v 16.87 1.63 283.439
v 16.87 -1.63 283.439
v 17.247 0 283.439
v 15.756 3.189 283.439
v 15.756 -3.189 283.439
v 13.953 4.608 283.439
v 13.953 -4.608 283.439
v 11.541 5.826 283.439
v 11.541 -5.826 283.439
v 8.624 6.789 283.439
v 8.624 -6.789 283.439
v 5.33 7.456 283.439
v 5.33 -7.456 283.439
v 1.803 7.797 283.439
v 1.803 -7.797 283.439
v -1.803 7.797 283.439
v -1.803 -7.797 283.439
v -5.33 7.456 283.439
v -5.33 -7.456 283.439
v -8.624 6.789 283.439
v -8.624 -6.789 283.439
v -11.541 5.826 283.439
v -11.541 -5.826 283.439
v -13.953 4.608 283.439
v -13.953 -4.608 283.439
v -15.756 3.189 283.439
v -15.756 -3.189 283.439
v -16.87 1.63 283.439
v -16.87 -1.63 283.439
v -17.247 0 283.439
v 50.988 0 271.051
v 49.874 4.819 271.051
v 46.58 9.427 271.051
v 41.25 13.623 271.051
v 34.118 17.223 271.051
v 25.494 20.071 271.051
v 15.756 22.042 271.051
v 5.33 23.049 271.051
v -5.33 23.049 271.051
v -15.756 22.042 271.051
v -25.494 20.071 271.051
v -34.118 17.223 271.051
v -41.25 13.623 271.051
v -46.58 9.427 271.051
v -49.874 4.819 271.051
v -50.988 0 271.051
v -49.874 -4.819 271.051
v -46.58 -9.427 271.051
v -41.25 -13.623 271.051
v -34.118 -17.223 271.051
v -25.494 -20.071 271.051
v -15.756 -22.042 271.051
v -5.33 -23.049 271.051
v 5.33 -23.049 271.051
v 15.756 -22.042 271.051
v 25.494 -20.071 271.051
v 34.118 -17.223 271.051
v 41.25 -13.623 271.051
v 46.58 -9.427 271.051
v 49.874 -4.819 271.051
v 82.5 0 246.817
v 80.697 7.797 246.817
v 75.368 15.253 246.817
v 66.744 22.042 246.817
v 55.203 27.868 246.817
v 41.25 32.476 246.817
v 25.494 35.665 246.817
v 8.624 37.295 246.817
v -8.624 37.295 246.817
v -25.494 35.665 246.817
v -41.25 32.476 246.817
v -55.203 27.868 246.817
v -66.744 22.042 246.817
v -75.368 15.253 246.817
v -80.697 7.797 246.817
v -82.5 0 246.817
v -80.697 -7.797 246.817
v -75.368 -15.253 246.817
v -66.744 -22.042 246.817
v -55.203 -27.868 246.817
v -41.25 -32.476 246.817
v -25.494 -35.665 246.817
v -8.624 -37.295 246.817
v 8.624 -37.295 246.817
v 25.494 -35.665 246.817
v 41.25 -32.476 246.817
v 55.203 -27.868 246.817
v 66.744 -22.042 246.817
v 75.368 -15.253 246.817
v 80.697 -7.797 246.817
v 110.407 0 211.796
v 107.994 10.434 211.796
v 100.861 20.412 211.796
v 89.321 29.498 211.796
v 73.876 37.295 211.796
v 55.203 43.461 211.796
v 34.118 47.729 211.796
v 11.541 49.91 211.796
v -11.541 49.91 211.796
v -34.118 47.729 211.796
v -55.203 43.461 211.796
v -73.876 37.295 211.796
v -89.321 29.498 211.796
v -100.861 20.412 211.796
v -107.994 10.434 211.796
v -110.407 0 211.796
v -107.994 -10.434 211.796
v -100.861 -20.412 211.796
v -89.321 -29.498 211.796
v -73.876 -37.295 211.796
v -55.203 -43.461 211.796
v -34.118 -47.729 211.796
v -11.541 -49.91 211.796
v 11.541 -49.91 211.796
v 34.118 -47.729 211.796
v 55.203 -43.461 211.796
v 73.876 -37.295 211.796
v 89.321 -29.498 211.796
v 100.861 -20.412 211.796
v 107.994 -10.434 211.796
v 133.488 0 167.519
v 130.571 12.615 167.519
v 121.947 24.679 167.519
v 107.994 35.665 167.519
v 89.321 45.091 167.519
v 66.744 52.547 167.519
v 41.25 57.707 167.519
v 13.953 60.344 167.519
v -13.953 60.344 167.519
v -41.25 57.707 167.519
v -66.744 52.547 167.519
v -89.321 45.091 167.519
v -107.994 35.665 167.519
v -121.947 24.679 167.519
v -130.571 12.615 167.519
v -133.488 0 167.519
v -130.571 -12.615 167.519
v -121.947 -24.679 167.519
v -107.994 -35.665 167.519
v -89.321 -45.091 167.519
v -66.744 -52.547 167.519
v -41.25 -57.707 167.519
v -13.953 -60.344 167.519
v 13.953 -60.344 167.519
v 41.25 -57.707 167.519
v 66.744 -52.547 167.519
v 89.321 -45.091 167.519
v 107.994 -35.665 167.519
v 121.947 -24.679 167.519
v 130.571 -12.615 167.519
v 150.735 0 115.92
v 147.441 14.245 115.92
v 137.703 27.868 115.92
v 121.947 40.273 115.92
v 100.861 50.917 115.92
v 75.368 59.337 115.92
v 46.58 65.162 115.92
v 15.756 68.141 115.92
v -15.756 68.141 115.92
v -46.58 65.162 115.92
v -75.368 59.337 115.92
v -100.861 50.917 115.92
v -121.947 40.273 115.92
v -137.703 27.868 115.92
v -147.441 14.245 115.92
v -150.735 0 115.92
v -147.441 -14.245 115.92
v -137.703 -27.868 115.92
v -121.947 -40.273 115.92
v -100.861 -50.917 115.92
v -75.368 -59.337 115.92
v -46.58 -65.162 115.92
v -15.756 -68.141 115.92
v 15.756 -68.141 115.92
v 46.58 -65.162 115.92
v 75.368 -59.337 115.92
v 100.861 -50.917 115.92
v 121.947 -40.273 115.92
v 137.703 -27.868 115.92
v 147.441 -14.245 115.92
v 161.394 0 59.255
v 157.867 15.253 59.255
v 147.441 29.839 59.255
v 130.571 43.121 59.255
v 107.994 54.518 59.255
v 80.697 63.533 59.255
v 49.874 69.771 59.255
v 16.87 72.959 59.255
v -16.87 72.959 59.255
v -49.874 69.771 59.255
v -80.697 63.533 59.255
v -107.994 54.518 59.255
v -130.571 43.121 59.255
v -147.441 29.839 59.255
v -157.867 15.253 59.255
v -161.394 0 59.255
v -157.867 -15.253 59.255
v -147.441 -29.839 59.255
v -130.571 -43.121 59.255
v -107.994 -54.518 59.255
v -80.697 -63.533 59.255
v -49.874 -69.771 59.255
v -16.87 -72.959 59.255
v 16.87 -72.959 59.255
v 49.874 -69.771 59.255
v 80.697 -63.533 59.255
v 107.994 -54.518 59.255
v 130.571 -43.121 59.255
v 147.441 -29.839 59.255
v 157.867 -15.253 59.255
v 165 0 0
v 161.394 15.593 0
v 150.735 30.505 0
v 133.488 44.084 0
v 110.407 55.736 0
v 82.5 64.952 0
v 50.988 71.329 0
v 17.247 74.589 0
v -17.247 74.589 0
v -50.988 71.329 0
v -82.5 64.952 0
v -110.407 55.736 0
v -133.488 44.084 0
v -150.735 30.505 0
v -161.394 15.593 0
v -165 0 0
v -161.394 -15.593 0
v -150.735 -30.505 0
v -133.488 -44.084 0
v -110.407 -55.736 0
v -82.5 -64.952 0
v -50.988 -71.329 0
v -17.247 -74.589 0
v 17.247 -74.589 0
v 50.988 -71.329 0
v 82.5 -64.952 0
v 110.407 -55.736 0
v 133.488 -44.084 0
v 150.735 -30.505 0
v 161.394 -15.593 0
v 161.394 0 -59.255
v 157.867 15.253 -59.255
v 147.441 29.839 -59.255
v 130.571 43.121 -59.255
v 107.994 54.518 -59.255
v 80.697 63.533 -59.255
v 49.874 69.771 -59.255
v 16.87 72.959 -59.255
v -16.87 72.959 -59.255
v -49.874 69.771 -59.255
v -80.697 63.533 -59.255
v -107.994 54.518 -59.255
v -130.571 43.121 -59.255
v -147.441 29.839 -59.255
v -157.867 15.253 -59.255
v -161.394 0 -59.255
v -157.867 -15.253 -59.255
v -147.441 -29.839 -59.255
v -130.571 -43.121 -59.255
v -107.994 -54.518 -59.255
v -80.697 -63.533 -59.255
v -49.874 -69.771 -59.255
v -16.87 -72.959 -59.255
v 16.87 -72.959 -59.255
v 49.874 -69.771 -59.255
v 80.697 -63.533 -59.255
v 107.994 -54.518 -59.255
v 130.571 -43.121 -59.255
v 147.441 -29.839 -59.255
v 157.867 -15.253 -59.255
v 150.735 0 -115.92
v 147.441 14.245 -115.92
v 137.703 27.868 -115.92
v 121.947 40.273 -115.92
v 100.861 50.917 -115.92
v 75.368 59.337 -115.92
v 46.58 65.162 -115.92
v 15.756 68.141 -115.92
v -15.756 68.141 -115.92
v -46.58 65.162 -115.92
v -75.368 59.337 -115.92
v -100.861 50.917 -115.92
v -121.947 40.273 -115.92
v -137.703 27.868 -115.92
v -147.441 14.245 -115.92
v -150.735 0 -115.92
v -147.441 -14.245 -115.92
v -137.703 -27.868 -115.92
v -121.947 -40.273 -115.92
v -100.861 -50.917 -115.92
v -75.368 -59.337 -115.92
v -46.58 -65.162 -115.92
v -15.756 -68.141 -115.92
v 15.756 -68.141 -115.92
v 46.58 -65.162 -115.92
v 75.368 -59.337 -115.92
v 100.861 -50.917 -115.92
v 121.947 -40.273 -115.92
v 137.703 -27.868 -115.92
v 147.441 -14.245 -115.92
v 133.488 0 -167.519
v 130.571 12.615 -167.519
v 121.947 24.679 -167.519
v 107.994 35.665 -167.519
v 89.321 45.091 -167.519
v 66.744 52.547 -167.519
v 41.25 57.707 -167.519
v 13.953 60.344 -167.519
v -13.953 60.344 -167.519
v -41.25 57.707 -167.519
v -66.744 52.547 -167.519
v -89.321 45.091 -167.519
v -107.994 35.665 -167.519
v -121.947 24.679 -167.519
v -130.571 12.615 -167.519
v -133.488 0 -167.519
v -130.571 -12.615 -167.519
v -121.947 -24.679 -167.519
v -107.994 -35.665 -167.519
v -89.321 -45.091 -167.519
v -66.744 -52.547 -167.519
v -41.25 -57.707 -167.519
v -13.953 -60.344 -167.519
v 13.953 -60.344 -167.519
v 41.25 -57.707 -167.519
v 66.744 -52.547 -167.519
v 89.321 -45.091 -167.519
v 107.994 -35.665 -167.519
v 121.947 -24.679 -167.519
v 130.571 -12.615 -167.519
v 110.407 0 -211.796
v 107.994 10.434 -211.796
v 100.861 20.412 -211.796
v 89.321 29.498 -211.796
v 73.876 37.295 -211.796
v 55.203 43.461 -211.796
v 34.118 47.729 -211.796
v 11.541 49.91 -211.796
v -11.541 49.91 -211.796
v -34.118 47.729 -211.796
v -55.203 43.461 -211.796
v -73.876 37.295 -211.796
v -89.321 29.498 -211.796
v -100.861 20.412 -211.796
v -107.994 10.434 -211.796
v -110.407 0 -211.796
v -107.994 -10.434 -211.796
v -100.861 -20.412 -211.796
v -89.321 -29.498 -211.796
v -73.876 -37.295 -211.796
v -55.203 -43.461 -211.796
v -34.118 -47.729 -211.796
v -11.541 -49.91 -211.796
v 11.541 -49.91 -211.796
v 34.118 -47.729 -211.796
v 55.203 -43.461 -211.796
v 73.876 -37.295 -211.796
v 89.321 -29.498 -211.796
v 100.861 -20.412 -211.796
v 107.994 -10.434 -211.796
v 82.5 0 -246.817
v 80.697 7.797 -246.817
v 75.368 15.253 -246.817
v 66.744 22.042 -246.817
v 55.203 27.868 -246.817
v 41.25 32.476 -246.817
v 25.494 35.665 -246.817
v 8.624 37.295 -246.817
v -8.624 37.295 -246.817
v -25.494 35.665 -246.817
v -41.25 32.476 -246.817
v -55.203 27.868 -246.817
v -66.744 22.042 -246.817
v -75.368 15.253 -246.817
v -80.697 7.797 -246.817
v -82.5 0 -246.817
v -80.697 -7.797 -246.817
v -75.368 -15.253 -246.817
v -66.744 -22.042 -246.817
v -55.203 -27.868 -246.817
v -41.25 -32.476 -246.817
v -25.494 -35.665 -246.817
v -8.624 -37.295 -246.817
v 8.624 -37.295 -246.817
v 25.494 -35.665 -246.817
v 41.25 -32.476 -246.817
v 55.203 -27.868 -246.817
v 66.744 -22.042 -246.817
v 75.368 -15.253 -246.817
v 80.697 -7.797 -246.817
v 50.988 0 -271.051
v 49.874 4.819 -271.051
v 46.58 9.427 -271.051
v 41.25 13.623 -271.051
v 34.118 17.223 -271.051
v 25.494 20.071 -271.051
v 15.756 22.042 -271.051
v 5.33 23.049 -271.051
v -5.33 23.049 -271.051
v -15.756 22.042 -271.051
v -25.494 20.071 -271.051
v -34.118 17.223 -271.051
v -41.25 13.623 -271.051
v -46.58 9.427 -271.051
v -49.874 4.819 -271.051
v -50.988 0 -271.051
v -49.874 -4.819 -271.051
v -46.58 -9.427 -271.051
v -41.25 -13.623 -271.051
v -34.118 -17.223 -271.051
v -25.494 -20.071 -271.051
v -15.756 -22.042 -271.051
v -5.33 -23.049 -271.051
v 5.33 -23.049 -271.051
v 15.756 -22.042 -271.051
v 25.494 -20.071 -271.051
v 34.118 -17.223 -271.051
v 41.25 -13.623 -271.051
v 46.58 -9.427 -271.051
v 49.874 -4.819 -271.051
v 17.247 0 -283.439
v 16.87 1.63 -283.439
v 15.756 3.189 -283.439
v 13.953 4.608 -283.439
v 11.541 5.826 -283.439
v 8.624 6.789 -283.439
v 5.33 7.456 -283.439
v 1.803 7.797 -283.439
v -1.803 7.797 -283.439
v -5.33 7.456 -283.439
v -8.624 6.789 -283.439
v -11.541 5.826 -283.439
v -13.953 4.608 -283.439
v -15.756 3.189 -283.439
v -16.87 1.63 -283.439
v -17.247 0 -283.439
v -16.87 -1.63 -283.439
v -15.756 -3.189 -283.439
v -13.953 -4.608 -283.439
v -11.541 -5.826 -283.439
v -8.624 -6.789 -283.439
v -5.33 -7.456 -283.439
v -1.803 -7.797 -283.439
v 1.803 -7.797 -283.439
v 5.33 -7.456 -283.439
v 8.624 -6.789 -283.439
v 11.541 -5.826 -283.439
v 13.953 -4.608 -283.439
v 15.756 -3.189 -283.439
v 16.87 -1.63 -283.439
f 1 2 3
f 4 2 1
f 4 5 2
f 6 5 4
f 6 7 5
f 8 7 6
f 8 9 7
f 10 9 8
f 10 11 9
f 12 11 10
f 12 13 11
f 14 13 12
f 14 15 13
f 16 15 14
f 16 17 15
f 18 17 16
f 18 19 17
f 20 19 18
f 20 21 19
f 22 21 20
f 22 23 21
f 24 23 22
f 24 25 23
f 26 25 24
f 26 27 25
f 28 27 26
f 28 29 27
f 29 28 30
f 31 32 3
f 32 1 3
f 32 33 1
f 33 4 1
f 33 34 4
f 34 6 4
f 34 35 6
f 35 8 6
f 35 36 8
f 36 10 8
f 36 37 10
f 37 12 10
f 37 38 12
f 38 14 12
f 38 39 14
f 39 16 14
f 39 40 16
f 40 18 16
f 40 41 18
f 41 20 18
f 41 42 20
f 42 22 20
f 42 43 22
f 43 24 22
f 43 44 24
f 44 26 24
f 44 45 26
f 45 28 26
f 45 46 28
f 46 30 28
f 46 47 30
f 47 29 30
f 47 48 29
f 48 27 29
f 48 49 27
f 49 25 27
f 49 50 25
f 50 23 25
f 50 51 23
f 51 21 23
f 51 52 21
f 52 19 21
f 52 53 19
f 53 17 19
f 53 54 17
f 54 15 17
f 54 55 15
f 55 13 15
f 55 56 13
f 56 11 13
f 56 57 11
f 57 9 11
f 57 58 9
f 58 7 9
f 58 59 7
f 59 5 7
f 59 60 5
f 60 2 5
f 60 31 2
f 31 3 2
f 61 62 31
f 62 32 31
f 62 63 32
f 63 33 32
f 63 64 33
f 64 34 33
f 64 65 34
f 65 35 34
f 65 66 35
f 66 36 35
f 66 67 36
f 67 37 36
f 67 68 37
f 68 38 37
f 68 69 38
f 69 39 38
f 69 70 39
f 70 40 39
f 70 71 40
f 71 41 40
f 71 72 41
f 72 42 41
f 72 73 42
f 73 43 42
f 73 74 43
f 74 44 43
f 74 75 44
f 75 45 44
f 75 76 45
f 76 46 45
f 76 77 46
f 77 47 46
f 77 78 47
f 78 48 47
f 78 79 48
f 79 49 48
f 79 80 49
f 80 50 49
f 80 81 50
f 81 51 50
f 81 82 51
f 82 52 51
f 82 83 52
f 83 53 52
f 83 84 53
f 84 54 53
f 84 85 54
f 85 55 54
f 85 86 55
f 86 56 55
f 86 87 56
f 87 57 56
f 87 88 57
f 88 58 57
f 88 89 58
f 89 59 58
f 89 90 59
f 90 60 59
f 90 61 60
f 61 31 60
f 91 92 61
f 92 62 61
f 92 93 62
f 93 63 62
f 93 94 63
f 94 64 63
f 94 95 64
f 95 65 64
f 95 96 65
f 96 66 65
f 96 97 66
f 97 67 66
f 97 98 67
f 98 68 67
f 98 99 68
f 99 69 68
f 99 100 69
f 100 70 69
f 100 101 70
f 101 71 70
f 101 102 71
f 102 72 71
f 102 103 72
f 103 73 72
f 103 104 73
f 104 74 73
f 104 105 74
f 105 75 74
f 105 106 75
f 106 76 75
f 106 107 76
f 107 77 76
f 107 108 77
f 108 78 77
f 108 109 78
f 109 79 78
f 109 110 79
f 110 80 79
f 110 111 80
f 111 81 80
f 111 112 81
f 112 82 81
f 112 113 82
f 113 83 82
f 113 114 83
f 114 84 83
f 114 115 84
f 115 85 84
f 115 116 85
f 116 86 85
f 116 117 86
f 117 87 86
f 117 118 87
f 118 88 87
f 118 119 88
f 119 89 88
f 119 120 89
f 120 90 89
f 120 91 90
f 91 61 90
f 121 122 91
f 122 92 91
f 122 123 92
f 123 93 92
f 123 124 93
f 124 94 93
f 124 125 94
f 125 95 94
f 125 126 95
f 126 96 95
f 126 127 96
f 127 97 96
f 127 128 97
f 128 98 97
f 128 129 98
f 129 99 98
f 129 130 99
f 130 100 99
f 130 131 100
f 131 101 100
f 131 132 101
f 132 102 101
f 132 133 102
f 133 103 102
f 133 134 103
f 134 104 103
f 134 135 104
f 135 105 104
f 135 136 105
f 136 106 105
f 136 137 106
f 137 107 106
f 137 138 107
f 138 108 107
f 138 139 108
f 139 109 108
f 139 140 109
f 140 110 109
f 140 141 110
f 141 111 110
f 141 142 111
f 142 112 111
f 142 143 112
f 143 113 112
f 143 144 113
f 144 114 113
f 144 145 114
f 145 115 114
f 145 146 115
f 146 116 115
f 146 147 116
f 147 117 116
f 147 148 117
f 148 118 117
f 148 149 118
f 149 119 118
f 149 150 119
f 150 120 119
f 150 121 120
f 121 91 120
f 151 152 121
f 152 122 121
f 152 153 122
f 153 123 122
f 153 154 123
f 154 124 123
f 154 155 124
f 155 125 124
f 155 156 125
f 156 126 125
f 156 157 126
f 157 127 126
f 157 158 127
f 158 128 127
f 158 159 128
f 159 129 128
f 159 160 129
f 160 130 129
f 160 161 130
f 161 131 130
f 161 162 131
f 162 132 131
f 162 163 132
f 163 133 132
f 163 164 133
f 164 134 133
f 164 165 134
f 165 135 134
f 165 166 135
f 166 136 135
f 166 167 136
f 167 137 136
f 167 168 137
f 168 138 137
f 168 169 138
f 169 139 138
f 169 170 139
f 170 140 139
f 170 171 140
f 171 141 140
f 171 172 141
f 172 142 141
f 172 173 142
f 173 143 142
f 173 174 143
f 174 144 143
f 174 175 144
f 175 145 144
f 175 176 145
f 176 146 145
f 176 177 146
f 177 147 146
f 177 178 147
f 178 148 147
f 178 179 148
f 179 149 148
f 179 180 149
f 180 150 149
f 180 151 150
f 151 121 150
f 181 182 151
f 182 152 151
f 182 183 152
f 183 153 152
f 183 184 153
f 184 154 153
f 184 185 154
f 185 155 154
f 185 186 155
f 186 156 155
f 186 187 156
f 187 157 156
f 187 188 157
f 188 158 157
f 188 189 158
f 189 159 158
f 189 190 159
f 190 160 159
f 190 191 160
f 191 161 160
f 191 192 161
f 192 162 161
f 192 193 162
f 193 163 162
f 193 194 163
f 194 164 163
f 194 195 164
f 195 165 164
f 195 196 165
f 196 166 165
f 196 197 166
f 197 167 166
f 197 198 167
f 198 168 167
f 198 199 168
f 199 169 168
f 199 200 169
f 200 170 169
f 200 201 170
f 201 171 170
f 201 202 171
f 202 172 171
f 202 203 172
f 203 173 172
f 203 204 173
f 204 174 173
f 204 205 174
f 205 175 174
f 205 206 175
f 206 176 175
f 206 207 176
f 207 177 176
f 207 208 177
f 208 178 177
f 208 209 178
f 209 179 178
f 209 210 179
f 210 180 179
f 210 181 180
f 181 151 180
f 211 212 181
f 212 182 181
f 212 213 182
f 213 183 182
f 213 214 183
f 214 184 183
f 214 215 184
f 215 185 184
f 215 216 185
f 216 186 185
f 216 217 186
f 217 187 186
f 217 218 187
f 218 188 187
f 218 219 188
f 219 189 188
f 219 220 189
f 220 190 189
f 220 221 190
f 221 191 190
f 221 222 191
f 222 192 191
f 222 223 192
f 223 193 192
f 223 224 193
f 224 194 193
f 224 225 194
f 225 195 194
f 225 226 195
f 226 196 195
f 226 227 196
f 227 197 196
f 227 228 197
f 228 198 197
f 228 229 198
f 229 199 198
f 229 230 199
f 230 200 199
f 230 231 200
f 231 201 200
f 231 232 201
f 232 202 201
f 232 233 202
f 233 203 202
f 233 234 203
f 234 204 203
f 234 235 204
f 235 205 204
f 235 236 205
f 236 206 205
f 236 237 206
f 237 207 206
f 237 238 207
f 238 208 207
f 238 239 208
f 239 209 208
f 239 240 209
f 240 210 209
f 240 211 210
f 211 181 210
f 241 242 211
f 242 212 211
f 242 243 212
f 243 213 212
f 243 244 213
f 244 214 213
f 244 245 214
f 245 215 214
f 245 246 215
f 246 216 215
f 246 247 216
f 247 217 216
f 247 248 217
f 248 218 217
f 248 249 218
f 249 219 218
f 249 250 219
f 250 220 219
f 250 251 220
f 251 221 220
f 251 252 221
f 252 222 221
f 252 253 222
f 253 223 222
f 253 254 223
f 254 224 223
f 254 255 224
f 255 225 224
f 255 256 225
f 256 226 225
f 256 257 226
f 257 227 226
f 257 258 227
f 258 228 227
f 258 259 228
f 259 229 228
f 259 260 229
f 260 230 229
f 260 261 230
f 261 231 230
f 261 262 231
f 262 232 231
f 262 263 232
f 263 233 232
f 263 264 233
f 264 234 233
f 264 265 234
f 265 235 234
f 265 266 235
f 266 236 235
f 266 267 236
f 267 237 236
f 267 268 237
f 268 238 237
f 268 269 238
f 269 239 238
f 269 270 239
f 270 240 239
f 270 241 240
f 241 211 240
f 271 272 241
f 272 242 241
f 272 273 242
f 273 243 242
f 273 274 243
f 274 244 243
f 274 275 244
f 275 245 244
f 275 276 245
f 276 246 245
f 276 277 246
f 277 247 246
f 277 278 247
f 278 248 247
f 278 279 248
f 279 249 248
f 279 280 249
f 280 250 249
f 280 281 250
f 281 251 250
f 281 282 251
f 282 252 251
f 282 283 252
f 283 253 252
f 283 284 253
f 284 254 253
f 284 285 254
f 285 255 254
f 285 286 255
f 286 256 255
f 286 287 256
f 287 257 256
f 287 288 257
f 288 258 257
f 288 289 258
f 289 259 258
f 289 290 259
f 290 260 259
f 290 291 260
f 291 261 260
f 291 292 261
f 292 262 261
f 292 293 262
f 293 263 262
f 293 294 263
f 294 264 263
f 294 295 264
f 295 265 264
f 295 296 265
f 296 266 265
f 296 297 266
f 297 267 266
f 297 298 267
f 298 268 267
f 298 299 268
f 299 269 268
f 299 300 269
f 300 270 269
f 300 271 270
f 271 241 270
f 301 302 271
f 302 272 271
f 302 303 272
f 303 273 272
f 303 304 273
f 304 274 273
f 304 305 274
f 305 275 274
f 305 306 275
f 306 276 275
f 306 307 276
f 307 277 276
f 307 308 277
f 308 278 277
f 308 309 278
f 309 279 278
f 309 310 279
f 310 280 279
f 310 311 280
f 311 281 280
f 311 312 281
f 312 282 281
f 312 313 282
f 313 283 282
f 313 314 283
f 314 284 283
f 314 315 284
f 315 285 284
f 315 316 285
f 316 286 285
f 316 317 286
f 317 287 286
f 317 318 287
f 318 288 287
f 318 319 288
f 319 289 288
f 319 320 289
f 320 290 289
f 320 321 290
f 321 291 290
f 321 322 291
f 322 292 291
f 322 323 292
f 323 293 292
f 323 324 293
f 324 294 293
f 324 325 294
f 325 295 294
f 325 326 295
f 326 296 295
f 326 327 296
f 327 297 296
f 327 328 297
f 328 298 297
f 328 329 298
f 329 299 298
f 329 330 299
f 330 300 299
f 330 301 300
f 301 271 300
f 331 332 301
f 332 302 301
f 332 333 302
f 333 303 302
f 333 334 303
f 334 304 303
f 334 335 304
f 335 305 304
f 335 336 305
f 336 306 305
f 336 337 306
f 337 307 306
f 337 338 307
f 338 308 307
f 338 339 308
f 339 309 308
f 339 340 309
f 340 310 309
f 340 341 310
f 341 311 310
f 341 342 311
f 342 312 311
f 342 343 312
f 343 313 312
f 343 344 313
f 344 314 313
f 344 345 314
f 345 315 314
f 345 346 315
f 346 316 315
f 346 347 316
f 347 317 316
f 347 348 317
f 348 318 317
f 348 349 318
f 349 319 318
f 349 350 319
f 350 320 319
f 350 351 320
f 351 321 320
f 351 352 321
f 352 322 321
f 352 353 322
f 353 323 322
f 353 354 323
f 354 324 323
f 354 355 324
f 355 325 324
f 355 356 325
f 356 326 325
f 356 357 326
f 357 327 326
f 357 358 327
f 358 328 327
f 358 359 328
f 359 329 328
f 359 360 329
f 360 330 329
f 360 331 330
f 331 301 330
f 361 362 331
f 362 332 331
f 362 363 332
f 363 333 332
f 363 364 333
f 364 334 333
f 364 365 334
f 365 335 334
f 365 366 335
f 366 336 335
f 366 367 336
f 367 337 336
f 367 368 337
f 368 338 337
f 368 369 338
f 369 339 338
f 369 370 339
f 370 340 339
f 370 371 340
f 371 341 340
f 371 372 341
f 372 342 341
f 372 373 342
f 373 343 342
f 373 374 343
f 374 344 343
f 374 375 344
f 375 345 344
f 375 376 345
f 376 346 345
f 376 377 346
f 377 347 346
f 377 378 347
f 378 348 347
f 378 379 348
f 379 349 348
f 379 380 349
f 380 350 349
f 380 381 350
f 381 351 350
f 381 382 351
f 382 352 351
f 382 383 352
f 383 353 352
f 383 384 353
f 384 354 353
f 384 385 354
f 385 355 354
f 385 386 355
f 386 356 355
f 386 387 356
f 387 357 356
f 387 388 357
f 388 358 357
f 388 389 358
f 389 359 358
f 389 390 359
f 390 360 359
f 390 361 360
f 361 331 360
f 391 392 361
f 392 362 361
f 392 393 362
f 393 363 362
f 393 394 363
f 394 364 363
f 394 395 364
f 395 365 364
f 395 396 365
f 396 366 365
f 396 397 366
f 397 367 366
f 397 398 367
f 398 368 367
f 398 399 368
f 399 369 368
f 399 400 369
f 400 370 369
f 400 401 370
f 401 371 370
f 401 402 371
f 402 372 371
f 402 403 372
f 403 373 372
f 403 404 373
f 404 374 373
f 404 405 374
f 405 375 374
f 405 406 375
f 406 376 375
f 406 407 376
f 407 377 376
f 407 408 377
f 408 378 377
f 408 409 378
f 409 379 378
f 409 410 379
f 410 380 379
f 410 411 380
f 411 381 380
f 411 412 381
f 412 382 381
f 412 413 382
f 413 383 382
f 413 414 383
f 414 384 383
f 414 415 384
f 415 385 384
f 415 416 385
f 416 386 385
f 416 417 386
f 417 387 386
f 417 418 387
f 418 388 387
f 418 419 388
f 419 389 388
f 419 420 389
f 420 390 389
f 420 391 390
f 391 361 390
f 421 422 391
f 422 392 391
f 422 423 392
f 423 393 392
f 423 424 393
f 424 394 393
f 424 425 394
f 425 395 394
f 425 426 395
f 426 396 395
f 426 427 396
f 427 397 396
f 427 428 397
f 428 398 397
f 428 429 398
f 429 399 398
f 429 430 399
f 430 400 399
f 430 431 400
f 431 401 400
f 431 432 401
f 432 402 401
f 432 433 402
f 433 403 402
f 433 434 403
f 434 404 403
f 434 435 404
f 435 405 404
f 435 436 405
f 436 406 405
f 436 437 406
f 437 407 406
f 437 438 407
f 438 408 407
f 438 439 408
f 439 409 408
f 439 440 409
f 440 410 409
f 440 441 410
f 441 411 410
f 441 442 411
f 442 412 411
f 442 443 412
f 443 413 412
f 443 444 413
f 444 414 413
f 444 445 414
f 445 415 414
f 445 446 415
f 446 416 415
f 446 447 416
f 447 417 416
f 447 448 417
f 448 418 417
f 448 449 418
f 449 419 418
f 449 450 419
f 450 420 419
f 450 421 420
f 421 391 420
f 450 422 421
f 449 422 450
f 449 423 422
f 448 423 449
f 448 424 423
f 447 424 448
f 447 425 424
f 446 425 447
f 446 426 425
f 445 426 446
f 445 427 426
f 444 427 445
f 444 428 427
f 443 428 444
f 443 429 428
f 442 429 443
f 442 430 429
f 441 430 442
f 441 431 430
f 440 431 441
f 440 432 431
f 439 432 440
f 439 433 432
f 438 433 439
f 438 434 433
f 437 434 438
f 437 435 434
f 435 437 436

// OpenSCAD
// Generated by SolidPython 1.0.1 on 2020-07-29 00:46:49


scale(v = [11, 5, 19]) {
	sphere(r = 15);
}
/***********************************************
*********      SolidPython code:      **********
************************************************
 
# import packages: SolidPython
from solid import *
from solid.utils import *
from itertools import chain, combinations, permutations


class Resize:

    def __init__(self, scad_file):
        self.scad_file = scad_file
        #self.scad_file = import_scad(scad_file)
        # cone/cylinder param:
        self.r1 = 0
        self.r2 = 0
        self.h = 0
        # rectangular prism param:
        self.w = 0
        self.l = 0
        # ellipse param:
        self.r = 0

    # import OpenScad code (file name corresponds to shape)


    # classify shape + parameters
    def assign(self, param1, param2, param3):
        if self.scad_file == 'cone.scad':
            self.r1 = param1
            self.r2 = param2
            self.h = param3
        elif self.scad_file == 'cylinder.scad':
            self.r1 = param1
            self.r2 = param2
            self.h = param3
        elif self.scad_file == 'rectangularPrism.scad':
            self.h = param1
            self.l = param2
            self.w = param3
        else:
            self.r = param1
            self.h = param2

    # resize parameters
    def iterate(self):
        x = range(3, 20, 2)
        i = 1
        if self.scad_file == 'cone.scad':
            tempList = list(permutations(x, 2))
            for temp in tempList:
                param1 = temp[0]
                param2 = temp[1]
                filepath = 'produced_scad_files/' + 'cone' + str(param1) + '_' + str(param2) + '_' + '.scad'
                scad_render_to_file(cylinder(h=param1, r1=param2, r2=0), filepath)

        elif self.scad_file == 'cylinder.scad':
            tempList = list(permutations(x, 3))
            for temp in tempList:
                param1 = temp[0]
                param2 = temp[1]
                filepath = 'produced_scad_files/' + 'cylinder' + str(param1) + '_' + str(param2) + '_' + '.scad'
                scad_render_to_file(cylinder(h=param1, r1=param2, r2=param2), filepath)

        elif self.scad_file == 'rectangularPrism.scad':
            tempList = list(permutations(x, 3))
            for temp in tempList:
                param1 = temp[0]
                param2 = temp[1]
                param3 = temp[2]
                filepath = 'produced_scad_files/' + 'rectangularPrism' + str(param1) + '_' + str(param2) + '_' + str(
                    param3) + '.scad'
                scad_render_to_file(cube(size=(param1, param2, param3)), filepath)

        elif self.scad_file == 'ellipse.scad':
            tempList = list(permutations(x, 4))
            for temp in tempList:
                param1 = temp[0]
                param2 = temp[1]
                param3 = temp[2]
                param4 = temp[3]
                filepath = 'produced_scad_files/' + 'ellipse' + str(param1) + '_' + str(param2) + '_' + str(param3) + '_' + str(param4) + '.scad'
                scad_render_to_file(scale([param1, param2, param3])(sphere(r=param4)), filepath)

    def render_to_scadfile(self):
        scad_render_to_file(scad, 'example.scad') 
 
************************************************/
